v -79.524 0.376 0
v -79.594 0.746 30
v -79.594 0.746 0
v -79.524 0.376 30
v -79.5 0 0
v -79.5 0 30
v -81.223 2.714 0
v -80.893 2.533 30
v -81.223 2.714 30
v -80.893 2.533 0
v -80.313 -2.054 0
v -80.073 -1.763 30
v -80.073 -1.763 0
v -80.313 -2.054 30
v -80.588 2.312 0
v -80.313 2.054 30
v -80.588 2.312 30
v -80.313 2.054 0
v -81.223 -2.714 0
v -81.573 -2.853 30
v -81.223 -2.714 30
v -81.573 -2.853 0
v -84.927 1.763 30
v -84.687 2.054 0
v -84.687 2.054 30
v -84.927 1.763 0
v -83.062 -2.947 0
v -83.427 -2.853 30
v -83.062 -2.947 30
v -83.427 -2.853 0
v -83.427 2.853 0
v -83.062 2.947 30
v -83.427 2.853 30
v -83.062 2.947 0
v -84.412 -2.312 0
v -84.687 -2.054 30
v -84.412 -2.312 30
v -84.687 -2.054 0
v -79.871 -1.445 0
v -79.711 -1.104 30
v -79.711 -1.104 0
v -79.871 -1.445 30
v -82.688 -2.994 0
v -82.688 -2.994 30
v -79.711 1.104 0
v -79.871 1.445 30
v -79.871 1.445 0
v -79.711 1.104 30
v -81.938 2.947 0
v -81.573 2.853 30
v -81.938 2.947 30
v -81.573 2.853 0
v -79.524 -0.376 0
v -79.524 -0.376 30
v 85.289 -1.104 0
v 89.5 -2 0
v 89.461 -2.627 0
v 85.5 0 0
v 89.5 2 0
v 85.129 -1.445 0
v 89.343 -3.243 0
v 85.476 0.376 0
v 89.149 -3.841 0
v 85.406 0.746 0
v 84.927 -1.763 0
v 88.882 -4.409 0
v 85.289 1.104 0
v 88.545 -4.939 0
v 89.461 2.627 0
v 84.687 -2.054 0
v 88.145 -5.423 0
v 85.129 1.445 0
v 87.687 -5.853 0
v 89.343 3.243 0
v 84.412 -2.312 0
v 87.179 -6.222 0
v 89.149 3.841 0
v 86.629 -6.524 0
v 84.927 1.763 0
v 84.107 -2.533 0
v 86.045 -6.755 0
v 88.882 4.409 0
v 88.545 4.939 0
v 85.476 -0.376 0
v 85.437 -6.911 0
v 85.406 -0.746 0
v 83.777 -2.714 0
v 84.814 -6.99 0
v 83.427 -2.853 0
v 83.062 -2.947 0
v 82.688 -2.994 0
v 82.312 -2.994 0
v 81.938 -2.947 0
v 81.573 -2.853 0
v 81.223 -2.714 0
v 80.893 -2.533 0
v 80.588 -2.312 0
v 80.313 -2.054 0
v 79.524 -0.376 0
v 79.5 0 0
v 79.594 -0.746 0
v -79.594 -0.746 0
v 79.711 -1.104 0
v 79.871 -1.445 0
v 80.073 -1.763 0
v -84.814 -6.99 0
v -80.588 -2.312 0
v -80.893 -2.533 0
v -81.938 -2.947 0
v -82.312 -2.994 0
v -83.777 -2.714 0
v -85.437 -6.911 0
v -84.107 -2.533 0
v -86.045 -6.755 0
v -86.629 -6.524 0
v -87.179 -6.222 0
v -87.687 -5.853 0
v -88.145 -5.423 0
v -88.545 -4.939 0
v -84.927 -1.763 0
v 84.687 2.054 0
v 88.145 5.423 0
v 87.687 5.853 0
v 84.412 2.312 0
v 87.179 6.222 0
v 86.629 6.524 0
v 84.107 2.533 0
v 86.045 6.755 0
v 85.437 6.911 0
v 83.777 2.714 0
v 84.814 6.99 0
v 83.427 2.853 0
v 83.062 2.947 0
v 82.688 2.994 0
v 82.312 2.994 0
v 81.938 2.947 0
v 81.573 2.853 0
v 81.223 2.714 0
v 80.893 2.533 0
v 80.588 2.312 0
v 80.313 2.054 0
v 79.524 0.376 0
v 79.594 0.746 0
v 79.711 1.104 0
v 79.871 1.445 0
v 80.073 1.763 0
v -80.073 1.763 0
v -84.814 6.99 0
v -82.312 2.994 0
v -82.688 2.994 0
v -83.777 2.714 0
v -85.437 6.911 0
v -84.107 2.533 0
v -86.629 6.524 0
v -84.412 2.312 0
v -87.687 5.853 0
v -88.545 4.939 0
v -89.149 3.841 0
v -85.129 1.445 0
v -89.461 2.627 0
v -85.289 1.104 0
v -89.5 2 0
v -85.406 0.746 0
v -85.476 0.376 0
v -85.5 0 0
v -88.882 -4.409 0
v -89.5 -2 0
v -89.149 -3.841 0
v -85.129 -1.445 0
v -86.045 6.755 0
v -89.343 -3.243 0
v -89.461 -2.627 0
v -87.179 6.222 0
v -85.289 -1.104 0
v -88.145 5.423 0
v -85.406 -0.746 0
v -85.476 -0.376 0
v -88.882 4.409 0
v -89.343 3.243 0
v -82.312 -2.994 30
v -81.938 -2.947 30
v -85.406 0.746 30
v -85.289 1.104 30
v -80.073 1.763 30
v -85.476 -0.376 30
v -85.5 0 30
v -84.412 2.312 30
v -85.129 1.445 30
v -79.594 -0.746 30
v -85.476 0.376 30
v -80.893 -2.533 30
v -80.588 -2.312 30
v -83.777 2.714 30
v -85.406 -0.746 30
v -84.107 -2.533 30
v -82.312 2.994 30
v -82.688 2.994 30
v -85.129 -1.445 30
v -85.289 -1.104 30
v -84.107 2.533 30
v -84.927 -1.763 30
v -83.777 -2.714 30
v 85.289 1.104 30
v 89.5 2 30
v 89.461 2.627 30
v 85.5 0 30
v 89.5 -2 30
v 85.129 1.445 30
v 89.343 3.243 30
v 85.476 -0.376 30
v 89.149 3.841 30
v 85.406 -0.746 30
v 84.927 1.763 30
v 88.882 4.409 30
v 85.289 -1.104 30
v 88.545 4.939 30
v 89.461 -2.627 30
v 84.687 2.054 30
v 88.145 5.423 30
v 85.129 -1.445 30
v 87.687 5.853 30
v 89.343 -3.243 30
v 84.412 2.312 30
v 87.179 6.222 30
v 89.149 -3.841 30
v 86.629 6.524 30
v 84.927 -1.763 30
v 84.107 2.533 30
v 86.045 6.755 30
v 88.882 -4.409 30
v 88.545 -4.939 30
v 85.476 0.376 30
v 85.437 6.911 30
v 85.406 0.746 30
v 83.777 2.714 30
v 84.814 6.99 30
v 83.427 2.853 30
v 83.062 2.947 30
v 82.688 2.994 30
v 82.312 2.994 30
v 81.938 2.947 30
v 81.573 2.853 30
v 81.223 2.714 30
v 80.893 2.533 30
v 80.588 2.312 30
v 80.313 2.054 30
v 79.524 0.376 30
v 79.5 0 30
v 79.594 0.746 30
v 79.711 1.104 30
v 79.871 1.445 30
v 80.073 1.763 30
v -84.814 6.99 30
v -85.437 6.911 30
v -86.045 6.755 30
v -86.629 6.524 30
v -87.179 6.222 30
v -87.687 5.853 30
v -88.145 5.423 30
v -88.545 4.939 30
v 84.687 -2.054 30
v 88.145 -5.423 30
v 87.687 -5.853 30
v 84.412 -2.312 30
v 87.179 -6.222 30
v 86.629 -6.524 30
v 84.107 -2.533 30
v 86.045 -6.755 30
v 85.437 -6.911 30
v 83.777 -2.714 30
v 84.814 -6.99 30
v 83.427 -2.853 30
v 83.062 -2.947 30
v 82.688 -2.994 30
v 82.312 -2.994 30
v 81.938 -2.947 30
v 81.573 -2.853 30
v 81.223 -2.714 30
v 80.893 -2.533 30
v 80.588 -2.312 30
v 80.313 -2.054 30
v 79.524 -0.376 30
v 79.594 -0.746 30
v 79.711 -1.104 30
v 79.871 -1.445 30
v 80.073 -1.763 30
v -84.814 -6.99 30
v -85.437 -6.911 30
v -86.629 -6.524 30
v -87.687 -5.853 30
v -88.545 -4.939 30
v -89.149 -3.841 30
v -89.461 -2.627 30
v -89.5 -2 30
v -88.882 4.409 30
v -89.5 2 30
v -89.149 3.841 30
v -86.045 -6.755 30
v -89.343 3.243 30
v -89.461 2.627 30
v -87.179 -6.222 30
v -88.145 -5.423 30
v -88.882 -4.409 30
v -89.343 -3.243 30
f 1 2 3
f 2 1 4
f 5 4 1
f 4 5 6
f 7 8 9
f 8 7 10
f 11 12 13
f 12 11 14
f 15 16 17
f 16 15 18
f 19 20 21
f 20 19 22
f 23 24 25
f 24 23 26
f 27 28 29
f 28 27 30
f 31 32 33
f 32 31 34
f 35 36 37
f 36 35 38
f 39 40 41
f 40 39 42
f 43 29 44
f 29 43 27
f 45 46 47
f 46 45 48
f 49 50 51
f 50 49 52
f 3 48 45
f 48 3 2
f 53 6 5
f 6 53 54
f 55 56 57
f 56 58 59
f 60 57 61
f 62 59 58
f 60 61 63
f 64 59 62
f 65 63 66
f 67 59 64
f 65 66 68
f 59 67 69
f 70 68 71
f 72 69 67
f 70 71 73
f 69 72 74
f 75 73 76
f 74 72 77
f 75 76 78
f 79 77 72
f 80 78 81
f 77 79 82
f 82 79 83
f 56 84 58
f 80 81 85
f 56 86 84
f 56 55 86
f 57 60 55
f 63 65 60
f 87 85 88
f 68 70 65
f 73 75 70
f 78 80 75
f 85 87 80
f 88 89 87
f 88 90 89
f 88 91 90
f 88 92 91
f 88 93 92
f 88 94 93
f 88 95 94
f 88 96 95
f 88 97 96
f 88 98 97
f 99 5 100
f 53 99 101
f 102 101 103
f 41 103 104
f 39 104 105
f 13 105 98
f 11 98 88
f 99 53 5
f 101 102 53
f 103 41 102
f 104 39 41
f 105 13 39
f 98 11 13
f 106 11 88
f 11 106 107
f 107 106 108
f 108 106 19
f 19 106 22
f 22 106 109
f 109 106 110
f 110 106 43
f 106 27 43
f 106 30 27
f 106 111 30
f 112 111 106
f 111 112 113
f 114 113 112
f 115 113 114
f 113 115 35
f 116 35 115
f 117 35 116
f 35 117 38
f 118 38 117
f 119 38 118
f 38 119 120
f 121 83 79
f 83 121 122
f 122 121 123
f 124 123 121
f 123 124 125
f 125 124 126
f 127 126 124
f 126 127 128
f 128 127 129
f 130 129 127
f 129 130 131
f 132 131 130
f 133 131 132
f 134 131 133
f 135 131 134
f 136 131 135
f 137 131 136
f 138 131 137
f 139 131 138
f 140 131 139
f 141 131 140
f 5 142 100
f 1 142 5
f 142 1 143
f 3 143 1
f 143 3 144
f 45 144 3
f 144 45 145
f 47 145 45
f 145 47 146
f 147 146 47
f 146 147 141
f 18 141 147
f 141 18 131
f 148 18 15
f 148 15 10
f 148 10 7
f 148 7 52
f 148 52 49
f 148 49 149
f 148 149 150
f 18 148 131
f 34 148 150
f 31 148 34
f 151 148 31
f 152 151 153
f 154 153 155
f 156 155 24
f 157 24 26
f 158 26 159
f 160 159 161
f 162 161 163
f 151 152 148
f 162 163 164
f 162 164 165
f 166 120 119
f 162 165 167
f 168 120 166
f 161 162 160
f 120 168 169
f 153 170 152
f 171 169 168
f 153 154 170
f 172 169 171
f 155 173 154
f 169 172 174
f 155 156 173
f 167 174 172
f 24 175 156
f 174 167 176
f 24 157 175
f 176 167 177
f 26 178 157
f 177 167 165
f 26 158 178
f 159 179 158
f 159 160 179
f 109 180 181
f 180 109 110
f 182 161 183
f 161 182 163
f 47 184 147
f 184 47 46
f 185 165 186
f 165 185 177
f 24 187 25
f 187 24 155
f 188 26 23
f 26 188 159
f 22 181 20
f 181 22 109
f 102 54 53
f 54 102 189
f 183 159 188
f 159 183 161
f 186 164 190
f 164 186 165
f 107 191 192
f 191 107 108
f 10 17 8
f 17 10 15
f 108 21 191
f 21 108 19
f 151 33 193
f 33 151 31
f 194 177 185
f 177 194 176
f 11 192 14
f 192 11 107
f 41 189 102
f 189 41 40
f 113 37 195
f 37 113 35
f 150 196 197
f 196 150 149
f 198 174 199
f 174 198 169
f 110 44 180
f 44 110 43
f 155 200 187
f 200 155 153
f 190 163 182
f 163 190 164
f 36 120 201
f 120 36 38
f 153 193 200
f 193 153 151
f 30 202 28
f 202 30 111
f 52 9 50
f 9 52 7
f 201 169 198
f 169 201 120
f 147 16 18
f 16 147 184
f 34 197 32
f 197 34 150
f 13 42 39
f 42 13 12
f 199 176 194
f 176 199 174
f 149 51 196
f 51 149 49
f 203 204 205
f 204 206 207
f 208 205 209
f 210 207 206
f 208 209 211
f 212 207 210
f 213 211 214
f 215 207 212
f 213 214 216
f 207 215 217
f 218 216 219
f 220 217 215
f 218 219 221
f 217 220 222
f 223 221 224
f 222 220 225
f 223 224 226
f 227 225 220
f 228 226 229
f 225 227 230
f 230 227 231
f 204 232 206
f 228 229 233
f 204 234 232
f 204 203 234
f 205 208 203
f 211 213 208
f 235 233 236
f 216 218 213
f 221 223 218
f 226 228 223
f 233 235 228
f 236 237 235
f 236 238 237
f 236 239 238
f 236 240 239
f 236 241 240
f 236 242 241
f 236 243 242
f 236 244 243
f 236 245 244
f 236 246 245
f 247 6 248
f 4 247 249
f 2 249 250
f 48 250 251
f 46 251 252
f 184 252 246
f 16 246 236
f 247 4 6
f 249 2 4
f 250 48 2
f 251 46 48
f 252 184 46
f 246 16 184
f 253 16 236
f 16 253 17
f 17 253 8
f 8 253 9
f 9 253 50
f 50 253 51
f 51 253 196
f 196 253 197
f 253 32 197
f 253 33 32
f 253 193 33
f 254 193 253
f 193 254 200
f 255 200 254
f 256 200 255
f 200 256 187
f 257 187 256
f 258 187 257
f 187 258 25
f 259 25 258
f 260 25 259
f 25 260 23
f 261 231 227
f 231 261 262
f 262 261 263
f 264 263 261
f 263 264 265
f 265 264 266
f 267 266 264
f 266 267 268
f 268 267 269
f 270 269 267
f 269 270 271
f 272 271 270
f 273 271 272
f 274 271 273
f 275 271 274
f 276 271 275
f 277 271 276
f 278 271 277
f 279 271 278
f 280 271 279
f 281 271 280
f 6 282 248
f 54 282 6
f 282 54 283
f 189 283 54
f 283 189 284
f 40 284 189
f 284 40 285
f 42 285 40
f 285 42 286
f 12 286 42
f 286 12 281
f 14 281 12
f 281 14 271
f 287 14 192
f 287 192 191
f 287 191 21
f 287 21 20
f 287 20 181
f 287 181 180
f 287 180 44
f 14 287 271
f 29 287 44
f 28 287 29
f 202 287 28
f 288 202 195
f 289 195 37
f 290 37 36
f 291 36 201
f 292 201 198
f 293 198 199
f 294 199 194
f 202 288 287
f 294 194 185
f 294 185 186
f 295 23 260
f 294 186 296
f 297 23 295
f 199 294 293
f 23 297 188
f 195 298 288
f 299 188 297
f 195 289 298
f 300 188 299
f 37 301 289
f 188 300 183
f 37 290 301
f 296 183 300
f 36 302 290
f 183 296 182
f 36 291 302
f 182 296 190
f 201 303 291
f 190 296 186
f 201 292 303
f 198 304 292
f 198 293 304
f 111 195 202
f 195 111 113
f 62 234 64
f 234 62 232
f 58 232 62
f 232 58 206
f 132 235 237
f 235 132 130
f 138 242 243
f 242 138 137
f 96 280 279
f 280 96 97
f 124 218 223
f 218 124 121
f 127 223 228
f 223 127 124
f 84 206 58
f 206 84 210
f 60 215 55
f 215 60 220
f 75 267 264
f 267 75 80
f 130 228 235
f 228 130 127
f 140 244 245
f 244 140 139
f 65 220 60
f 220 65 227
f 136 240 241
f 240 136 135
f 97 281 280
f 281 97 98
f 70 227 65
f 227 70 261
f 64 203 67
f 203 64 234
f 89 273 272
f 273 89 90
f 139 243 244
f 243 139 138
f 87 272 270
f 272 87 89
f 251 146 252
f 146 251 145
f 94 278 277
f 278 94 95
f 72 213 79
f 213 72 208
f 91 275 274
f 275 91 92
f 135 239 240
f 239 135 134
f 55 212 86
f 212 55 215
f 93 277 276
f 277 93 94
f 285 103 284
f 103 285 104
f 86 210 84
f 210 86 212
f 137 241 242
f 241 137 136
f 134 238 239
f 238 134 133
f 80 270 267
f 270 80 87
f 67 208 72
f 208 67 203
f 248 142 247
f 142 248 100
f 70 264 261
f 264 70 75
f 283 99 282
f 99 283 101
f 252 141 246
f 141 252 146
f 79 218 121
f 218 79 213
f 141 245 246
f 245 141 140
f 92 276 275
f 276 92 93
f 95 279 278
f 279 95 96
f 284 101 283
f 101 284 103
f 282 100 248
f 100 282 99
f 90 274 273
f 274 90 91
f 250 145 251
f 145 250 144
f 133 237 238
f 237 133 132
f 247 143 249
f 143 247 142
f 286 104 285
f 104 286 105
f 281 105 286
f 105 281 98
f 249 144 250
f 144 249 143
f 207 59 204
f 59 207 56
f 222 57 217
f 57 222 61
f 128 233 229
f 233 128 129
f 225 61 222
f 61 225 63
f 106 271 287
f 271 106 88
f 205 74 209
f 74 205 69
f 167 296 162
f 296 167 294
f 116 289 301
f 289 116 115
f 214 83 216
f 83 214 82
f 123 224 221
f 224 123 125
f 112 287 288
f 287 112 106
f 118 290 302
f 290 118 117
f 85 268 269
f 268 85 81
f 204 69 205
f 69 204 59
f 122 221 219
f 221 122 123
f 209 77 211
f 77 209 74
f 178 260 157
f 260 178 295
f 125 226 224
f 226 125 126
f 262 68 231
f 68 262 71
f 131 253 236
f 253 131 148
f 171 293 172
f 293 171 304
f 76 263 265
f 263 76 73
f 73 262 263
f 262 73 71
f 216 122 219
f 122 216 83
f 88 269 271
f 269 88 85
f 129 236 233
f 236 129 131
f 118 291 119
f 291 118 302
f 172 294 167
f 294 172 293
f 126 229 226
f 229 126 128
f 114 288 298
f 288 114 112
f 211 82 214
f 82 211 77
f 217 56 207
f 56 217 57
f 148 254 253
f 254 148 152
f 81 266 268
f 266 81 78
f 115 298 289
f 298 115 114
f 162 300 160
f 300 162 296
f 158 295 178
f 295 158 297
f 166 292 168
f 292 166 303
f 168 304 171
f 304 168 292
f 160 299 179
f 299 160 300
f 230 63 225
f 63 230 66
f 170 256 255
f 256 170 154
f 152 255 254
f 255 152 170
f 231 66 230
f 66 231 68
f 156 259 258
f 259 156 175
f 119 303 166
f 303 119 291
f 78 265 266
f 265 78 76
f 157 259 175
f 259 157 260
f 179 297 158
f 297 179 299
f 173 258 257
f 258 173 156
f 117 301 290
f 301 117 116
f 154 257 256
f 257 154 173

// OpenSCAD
$fn = 50;


difference() {
	union() {
		hull() {
			translate(v = [-84.5000000000, 2.0000000000, 0]) {
				cylinder(h = 30, r = 5);
			}
			translate(v = [84.5000000000, 2.0000000000, 0]) {
				cylinder(h = 30, r = 5);
			}
			translate(v = [-84.5000000000, -2.0000000000, 0]) {
				cylinder(h = 30, r = 5);
			}
			translate(v = [84.5000000000, -2.0000000000, 0]) {
				cylinder(h = 30, r = 5);
			}
		}
	}
	union() {
		translate(v = [-82.5000000000, 0.0000000000, 0]) {
			cylinder(h = 30, r = 3.0000000000);
		}
		translate(v = [82.5000000000, 0.0000000000, 0]) {
			cylinder(h = 30, r = 3.0000000000);
		}
		translate(v = [-82.5000000000, 0.0000000000, 0]) {
			cylinder(h = 30, r = 1.5000000000);
		}
		translate(v = [82.5000000000, 0.0000000000, 0]) {
			cylinder(h = 30, r = 1.5000000000);
		}
		translate(v = [-82.5000000000, 0.0000000000, 0]) {
			cylinder(h = 30, r = 1.5000000000);
		}
		translate(v = [82.5000000000, 0.0000000000, 0]) {
			cylinder(h = 30, r = 1.5000000000);
		}
		translate(v = [-82.5000000000, 0.0000000000, 0]) {
			cylinder(h = 30, r = 1.5000000000);
		}
		translate(v = [82.5000000000, 0.0000000000, 0]) {
			cylinder(h = 30, r = 1.5000000000);
		}
	}
}
